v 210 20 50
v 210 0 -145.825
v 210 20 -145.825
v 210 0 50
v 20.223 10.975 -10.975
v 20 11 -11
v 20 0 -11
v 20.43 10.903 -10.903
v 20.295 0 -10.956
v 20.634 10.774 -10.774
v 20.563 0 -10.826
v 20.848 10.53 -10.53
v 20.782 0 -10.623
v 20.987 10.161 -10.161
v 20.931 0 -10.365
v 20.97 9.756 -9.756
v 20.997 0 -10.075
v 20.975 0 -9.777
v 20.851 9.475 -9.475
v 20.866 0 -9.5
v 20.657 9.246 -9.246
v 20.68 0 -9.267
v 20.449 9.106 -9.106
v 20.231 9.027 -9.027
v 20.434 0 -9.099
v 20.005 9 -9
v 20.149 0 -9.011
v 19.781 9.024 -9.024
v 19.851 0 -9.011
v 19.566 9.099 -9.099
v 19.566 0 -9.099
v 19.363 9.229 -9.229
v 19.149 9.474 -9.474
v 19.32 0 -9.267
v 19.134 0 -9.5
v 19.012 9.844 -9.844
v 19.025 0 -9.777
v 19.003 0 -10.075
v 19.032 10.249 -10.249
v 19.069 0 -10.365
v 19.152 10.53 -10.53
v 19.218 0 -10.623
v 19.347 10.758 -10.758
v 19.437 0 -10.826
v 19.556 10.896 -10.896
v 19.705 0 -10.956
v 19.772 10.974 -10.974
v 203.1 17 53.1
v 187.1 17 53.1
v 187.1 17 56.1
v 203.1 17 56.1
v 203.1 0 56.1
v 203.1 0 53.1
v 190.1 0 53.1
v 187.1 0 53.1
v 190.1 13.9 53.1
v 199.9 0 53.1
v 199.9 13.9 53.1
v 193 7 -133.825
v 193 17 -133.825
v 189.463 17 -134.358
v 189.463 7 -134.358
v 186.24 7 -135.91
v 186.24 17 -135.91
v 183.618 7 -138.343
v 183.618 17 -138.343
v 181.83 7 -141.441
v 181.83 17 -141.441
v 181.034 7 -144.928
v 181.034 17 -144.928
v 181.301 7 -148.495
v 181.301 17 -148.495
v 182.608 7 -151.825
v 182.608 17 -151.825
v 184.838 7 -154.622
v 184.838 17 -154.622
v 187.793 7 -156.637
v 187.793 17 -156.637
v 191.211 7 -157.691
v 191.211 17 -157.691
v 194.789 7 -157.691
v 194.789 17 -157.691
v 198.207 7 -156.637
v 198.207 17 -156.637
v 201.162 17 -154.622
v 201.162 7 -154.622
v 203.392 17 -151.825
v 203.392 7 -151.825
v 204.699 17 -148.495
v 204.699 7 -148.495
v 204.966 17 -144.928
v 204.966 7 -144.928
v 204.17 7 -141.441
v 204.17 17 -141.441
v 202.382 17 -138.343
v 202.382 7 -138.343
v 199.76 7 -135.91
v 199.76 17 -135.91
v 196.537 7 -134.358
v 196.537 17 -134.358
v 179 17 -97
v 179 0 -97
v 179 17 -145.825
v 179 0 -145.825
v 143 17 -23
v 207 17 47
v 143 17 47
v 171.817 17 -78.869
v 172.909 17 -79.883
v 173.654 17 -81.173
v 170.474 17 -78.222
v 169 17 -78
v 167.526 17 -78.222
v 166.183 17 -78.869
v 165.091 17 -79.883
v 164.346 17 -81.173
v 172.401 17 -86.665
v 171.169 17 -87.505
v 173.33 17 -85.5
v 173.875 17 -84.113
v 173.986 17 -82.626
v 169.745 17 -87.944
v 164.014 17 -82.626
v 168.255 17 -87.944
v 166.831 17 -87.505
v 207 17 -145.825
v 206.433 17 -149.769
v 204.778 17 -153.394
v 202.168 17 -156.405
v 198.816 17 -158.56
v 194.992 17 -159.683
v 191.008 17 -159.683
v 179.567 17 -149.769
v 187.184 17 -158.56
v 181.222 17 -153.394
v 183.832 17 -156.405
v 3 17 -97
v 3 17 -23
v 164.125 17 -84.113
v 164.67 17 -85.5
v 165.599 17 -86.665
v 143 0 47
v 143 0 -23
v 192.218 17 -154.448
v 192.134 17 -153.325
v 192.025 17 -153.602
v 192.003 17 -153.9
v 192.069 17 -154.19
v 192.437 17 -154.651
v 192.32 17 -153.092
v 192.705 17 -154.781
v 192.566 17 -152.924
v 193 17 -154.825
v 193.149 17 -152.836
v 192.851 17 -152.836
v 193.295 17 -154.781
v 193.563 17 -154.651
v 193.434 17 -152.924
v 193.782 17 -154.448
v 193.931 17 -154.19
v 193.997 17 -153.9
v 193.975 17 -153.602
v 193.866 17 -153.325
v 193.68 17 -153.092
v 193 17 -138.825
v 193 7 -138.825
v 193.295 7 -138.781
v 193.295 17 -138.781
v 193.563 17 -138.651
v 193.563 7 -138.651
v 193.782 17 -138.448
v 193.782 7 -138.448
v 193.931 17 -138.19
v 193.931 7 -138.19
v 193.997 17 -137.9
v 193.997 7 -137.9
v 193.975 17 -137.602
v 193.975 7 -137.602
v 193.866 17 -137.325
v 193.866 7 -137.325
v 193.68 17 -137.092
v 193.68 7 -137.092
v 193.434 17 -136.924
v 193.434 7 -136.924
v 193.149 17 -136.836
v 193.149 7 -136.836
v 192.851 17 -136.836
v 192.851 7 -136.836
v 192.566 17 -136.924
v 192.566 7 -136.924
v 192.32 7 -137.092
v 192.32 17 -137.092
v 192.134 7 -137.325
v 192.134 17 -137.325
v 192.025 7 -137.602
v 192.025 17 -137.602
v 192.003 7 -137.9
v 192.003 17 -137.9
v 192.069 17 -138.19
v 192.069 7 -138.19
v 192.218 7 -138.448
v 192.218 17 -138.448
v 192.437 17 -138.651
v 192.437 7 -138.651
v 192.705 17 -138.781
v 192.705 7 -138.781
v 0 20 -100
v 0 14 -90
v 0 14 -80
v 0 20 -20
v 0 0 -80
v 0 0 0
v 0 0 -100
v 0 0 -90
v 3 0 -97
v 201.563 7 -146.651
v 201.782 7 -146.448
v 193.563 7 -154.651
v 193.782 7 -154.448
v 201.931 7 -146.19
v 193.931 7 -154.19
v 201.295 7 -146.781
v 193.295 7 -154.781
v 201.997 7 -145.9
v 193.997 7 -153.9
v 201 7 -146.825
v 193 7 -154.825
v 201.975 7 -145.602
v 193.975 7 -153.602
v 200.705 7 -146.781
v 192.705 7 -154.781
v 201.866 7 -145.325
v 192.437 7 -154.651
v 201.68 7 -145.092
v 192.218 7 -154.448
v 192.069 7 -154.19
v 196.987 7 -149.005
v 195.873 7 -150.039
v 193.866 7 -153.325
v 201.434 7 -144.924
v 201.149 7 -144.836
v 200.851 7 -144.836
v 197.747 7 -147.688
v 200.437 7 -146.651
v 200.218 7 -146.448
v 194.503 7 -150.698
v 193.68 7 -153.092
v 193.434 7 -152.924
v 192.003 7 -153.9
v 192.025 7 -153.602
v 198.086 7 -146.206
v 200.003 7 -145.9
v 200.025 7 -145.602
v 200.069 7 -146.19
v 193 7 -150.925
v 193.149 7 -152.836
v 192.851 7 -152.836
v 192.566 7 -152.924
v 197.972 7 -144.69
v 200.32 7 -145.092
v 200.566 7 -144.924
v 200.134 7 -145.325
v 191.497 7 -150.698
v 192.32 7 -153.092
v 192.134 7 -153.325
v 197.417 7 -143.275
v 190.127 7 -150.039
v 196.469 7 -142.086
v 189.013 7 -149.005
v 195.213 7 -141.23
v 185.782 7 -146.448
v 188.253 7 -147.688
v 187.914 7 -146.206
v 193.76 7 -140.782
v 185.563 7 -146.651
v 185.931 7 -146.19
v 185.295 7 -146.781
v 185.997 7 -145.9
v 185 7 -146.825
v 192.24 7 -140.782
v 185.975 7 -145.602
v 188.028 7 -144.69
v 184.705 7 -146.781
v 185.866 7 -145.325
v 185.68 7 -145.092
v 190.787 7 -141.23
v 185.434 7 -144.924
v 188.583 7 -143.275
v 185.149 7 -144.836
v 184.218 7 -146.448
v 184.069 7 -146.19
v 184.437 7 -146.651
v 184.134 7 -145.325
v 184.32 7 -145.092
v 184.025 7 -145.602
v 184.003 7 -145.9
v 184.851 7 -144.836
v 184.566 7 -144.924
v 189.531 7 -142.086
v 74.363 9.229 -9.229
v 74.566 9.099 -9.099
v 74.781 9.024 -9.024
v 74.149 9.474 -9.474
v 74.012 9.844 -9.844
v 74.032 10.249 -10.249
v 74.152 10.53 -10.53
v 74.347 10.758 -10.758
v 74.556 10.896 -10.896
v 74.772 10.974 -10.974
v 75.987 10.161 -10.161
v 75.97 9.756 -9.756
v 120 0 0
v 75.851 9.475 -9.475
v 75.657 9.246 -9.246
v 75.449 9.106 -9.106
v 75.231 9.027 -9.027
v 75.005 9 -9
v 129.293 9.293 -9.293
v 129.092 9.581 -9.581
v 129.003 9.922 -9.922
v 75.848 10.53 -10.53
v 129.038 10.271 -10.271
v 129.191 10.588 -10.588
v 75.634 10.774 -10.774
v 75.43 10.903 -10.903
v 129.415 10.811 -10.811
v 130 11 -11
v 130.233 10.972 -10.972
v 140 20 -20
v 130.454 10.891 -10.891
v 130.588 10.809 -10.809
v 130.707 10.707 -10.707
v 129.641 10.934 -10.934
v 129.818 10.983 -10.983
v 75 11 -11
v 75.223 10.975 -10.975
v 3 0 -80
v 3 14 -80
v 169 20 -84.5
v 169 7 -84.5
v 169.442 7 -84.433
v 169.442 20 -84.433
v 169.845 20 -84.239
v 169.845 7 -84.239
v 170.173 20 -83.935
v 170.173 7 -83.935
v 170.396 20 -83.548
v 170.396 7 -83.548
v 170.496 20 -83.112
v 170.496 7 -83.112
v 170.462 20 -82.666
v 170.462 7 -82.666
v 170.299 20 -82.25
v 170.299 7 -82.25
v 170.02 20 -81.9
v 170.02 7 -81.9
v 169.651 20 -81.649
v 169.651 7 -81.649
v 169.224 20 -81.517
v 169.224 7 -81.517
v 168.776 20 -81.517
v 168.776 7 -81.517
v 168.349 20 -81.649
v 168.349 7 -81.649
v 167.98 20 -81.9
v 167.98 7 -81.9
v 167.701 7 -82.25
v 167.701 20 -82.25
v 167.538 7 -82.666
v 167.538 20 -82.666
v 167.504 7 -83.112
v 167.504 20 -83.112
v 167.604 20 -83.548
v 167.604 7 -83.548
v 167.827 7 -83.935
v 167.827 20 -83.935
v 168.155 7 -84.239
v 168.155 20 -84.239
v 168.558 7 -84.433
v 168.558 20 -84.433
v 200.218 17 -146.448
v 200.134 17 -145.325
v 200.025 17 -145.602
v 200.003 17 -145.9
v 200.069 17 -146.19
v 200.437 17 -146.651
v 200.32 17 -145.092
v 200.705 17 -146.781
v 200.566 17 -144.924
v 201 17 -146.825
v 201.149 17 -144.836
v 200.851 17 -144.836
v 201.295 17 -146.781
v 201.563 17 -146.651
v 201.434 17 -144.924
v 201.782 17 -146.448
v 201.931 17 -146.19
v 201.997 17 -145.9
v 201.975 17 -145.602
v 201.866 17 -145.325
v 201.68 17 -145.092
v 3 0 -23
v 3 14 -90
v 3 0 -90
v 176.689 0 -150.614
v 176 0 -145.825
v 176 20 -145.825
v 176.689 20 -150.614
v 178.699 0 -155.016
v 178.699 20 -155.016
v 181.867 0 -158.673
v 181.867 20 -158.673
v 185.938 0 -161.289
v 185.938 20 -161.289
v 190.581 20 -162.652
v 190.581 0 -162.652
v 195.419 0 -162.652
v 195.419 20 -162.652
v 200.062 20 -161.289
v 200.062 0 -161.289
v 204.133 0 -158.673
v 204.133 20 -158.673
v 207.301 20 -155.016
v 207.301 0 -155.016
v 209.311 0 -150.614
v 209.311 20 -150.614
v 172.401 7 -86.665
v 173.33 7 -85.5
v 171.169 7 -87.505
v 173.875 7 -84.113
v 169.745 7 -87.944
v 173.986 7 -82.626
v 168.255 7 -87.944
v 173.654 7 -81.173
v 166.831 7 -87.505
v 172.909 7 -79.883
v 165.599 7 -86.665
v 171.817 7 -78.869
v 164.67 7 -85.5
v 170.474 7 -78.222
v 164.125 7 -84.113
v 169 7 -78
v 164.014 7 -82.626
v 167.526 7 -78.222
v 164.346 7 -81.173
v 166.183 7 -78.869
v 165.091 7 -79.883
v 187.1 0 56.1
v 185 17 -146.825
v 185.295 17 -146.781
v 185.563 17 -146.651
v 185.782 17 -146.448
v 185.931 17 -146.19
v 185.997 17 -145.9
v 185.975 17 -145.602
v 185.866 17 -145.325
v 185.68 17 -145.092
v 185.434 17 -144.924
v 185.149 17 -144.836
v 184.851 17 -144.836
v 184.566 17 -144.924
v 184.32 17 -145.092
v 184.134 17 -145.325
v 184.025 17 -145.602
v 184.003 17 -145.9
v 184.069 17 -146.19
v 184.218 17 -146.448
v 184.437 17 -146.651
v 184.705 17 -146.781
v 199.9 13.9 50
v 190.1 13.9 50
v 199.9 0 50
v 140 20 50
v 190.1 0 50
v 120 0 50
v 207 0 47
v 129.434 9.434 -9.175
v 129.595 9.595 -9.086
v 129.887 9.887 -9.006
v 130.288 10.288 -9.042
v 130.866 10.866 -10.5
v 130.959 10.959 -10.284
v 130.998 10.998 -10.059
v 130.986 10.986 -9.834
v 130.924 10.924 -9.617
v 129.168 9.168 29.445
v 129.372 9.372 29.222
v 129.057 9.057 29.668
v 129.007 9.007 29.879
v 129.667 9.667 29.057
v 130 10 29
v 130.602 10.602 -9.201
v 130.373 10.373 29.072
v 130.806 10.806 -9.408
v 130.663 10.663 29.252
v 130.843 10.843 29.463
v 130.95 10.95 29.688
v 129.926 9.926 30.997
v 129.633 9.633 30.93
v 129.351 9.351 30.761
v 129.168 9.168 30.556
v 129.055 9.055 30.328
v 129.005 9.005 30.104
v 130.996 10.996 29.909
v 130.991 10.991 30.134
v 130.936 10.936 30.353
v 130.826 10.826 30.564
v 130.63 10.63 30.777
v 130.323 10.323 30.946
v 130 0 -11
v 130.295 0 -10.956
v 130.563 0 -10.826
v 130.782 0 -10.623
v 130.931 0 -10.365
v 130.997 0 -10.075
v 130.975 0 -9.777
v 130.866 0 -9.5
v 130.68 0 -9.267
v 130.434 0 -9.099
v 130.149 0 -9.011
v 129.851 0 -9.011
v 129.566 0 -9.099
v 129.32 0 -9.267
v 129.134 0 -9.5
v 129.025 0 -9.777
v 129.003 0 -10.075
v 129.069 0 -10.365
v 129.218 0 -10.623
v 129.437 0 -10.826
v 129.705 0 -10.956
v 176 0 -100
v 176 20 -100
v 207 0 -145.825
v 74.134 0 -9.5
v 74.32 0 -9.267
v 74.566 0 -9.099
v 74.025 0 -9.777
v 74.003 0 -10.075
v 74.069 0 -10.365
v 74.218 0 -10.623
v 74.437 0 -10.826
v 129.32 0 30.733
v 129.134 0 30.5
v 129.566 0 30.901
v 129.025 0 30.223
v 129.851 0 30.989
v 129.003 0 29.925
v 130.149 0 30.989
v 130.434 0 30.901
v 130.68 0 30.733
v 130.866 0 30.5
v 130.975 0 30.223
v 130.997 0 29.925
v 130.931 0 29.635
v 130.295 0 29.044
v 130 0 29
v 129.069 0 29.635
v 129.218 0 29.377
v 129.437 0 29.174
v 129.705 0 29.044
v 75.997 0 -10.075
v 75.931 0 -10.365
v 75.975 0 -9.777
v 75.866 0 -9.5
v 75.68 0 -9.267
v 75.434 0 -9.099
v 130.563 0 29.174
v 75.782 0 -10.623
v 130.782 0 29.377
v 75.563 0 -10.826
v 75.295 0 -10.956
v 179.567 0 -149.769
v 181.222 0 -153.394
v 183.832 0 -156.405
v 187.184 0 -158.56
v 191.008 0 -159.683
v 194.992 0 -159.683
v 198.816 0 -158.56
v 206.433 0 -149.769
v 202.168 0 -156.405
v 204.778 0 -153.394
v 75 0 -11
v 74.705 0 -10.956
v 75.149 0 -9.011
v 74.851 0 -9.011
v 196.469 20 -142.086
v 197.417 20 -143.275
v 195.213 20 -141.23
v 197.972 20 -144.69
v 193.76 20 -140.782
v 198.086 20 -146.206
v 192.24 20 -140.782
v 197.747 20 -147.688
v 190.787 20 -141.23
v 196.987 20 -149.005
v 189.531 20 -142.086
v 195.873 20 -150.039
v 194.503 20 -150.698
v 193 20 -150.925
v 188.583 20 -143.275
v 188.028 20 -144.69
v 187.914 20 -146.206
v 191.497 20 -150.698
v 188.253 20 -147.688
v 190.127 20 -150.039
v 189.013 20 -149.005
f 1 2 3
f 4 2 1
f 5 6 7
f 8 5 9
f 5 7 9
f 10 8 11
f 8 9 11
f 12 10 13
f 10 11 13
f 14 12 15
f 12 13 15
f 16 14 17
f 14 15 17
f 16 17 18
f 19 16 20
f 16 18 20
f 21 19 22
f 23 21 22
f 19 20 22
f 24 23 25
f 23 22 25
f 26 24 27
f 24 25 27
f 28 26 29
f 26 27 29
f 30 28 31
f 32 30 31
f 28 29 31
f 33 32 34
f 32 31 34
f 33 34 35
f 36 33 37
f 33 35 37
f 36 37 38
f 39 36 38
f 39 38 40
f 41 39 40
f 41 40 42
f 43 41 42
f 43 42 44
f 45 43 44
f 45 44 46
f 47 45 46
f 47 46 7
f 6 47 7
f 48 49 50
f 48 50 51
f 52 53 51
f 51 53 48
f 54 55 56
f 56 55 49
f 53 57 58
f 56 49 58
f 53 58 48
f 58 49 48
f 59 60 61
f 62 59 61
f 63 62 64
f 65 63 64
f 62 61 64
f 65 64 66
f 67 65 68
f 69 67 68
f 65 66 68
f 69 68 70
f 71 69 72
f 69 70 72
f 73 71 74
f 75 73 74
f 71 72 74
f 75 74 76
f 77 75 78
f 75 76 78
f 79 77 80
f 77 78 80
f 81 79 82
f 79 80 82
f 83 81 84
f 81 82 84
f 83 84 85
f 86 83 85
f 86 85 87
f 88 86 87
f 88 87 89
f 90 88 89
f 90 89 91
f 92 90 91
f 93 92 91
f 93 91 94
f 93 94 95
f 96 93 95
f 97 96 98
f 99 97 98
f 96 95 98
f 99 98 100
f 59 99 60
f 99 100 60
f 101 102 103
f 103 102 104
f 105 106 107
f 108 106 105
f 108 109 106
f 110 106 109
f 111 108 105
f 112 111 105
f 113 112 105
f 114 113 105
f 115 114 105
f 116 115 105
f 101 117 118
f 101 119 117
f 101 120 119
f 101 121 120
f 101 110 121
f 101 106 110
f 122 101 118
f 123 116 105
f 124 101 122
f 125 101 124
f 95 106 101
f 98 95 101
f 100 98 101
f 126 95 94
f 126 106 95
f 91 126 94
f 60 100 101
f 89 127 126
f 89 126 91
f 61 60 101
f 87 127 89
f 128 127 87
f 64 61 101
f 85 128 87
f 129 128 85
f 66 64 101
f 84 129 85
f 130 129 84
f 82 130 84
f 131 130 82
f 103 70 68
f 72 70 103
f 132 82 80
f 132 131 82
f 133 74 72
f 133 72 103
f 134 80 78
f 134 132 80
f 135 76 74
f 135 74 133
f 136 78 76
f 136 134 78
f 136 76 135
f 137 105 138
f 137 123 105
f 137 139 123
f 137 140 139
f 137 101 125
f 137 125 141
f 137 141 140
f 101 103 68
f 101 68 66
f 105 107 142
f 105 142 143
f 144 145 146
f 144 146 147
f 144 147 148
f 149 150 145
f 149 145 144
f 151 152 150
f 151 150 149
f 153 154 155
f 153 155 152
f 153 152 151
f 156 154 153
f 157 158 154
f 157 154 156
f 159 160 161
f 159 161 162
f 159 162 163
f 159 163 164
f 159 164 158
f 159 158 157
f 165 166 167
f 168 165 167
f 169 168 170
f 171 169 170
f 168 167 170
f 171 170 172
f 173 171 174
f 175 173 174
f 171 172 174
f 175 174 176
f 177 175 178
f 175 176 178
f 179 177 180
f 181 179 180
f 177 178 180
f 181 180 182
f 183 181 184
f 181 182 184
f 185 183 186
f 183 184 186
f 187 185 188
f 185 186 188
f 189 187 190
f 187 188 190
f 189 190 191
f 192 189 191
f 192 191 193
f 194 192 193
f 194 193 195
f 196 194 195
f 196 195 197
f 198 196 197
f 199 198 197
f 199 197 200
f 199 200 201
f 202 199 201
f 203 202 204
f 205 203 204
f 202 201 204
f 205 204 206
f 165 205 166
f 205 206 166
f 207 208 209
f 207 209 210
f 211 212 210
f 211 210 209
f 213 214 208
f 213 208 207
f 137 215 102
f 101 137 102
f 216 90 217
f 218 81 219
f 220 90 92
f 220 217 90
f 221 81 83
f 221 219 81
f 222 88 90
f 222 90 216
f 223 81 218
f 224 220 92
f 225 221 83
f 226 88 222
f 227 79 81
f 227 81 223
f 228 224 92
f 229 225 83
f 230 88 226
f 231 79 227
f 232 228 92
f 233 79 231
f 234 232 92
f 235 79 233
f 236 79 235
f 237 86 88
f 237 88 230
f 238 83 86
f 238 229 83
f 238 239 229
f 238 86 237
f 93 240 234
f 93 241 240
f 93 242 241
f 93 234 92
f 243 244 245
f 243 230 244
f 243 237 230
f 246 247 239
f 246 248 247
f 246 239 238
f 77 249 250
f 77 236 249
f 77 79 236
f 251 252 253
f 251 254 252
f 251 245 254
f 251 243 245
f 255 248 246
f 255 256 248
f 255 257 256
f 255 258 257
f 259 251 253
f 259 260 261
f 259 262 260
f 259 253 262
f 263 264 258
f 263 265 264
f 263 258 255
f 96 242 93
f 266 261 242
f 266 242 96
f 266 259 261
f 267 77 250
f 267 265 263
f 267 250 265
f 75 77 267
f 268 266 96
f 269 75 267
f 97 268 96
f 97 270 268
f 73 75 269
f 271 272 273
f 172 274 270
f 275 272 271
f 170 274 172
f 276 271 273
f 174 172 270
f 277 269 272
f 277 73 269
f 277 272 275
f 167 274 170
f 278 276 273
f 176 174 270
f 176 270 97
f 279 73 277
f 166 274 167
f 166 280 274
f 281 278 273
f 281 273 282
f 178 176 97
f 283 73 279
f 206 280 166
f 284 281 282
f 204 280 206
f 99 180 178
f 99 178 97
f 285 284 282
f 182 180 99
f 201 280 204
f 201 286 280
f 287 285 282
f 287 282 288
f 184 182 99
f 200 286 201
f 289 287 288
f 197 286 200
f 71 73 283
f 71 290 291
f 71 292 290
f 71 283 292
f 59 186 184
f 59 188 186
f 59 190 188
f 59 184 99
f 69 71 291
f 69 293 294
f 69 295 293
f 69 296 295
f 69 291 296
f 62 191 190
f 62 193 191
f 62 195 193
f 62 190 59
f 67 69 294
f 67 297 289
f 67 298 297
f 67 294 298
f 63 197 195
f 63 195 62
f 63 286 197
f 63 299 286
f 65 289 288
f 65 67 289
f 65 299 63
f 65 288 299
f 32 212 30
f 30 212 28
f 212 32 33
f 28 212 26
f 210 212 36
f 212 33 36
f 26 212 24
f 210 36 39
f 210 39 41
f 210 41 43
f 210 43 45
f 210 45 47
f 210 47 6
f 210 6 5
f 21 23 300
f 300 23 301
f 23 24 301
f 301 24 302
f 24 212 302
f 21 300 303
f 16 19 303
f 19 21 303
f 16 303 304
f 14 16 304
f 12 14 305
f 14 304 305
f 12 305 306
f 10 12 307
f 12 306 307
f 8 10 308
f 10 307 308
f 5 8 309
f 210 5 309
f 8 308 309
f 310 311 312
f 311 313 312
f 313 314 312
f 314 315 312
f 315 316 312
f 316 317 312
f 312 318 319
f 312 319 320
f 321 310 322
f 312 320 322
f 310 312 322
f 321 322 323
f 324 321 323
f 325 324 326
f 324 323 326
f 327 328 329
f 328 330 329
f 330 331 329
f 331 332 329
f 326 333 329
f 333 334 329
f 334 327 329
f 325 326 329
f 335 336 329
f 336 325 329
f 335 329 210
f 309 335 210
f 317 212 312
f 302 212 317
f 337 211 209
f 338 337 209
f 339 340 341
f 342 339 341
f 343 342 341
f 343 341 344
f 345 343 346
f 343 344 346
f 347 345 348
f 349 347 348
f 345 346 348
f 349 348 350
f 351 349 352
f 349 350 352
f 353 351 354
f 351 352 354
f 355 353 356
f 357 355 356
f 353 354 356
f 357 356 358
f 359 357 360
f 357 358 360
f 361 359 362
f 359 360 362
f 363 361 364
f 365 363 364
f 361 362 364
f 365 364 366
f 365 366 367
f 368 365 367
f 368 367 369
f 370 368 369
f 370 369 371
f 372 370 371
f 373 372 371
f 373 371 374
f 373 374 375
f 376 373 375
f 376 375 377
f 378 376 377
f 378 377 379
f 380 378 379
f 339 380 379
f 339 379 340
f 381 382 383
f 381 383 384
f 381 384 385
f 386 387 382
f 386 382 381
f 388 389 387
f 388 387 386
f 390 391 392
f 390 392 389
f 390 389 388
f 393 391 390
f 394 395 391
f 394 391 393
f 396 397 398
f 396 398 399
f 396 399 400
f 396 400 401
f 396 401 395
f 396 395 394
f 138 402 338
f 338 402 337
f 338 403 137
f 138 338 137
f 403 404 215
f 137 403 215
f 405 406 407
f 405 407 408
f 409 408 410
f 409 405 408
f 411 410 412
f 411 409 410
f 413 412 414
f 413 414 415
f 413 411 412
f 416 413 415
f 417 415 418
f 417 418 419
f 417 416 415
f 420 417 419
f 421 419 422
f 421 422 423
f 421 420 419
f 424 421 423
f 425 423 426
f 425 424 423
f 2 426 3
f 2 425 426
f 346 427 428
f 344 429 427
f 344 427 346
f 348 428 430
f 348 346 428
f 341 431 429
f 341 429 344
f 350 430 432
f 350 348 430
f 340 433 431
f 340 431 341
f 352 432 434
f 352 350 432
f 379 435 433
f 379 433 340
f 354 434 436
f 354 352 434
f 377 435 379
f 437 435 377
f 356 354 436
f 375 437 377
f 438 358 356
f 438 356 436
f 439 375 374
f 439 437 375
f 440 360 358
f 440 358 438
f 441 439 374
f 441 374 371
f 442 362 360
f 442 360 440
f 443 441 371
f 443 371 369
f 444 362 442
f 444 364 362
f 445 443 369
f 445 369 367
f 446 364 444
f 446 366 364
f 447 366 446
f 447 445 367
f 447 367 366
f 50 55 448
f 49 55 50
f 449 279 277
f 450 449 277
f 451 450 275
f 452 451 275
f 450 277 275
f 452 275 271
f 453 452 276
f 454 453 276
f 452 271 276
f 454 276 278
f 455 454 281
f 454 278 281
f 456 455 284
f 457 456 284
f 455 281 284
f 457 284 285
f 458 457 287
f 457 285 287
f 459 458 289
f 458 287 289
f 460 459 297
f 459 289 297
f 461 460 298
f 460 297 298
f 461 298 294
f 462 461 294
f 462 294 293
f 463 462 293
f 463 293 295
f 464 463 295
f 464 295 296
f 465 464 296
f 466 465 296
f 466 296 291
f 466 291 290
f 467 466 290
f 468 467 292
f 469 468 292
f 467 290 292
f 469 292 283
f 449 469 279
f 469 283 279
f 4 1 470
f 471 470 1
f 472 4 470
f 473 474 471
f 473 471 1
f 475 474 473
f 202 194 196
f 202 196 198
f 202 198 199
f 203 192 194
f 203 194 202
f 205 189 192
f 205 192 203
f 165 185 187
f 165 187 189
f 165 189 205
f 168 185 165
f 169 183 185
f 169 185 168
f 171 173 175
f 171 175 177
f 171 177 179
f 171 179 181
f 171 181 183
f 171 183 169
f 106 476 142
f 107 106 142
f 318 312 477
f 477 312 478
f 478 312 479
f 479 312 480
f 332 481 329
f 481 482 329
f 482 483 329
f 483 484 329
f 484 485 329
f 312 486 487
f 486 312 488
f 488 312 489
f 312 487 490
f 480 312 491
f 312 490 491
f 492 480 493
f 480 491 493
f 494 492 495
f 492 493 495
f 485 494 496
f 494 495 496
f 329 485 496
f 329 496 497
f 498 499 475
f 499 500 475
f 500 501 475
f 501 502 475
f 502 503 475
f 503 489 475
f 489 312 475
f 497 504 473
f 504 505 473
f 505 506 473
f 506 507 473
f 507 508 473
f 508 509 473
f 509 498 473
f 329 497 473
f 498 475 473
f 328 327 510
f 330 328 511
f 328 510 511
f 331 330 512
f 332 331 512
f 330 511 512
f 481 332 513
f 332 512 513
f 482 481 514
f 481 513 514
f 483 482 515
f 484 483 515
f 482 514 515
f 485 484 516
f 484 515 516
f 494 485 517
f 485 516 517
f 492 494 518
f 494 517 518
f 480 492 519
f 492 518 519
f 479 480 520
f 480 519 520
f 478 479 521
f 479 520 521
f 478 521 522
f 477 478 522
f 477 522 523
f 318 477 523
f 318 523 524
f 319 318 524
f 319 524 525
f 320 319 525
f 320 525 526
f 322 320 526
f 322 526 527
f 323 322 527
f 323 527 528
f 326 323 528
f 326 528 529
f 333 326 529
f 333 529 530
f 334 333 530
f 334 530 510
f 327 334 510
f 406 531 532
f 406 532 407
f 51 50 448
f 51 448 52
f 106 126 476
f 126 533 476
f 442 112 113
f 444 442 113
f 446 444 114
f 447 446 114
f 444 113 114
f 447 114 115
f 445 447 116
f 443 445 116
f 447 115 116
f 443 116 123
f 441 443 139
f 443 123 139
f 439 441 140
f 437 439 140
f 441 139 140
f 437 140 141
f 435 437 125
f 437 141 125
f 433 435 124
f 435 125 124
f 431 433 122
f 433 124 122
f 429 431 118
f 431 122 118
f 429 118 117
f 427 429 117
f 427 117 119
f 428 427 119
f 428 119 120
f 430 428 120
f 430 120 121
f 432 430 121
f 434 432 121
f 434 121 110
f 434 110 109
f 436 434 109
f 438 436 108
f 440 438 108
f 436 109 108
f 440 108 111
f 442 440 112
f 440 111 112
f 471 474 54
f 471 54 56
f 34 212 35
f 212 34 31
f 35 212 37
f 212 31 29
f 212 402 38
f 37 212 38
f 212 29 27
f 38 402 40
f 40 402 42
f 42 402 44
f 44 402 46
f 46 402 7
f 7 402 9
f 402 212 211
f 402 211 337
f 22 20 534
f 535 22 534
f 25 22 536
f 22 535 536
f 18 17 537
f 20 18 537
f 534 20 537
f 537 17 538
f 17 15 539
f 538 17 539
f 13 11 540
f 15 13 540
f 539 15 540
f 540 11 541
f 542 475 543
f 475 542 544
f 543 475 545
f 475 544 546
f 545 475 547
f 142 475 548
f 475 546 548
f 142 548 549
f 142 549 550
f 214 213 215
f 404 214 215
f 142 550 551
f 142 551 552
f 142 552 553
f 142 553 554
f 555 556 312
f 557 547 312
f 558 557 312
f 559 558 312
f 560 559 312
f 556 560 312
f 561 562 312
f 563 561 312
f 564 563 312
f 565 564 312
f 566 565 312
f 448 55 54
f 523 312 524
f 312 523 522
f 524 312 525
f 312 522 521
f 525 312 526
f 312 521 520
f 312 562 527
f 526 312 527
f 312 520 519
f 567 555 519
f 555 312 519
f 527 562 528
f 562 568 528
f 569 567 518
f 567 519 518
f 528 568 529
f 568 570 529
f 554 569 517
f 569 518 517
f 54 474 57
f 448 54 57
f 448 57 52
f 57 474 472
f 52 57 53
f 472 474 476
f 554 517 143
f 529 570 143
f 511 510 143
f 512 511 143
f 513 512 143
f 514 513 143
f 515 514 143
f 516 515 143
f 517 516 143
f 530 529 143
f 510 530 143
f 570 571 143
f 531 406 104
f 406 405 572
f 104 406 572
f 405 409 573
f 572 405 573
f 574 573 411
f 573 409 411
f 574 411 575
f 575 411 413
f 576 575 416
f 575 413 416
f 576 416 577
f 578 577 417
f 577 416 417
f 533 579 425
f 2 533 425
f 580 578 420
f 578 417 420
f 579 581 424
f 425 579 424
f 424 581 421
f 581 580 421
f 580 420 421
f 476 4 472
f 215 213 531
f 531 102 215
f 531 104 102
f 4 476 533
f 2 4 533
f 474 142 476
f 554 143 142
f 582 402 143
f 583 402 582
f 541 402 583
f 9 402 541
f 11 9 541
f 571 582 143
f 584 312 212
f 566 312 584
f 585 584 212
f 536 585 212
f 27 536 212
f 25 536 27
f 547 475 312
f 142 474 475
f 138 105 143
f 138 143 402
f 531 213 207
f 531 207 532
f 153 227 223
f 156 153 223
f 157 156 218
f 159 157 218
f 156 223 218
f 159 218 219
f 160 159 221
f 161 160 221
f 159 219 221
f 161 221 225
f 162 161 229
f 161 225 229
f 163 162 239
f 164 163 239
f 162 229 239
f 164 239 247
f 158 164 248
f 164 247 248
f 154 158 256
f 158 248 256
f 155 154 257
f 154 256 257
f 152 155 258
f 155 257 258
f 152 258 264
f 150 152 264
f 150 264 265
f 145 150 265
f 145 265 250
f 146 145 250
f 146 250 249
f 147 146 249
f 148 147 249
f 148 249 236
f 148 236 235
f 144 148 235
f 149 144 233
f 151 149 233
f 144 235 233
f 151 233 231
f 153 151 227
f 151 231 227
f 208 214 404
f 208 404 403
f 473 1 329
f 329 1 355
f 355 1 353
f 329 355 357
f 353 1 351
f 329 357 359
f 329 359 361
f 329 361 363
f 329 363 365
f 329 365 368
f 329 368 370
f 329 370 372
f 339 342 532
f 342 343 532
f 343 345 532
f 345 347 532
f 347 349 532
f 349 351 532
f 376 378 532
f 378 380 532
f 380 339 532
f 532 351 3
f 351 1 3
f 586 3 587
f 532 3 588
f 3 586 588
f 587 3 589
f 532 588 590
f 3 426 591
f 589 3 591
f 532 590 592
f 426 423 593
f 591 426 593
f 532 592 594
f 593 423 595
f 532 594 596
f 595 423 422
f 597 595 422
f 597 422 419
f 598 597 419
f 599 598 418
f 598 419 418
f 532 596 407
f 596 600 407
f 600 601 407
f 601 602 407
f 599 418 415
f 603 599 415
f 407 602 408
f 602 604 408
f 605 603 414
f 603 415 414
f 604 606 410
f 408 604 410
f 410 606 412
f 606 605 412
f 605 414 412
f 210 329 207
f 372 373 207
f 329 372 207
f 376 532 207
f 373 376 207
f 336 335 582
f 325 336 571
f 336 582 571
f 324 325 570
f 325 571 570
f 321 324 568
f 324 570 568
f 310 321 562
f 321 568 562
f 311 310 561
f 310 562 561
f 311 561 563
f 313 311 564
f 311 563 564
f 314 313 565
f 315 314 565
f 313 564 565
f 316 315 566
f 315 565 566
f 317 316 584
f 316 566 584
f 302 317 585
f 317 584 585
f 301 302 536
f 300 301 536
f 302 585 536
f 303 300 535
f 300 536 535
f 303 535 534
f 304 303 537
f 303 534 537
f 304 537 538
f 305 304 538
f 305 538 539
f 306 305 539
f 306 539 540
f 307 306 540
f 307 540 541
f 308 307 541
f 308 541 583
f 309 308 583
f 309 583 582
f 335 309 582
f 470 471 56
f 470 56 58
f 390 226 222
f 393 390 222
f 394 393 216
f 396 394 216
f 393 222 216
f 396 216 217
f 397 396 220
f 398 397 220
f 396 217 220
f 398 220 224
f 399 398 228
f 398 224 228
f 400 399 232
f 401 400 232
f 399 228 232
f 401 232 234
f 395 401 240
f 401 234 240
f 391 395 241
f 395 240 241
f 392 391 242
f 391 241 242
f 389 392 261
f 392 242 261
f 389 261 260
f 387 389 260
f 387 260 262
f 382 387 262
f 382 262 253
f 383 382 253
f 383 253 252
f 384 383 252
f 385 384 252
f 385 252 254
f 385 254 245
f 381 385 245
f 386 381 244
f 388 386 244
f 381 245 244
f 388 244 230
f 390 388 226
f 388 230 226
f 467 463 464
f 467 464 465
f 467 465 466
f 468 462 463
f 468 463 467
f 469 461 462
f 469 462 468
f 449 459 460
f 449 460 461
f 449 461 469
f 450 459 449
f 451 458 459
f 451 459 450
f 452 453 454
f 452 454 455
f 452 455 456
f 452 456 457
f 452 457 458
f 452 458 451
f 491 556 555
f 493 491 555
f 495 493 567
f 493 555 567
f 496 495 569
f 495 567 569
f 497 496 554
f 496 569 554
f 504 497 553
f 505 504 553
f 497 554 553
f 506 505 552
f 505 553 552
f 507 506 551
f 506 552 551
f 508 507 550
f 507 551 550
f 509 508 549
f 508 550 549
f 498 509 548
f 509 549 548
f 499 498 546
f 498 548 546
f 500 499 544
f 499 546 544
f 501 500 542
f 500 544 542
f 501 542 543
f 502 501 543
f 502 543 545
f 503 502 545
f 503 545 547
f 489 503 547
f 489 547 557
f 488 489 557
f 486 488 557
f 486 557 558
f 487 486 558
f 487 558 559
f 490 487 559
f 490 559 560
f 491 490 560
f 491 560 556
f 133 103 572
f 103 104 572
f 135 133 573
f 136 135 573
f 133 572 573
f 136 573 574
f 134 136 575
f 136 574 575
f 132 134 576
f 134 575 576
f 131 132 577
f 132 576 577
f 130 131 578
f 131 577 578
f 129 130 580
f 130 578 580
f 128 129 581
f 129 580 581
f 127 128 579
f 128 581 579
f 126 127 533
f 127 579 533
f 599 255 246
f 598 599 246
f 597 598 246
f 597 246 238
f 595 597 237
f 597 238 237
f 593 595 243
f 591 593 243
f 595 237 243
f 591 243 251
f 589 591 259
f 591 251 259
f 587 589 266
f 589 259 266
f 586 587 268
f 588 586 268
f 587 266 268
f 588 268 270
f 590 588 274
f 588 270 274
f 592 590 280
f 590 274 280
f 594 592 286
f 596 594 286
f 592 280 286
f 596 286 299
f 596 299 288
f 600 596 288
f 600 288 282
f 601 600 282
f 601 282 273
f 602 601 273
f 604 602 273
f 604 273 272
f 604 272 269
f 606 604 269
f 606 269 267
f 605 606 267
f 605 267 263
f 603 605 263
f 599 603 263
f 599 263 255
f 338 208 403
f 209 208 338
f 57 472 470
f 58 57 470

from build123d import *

# Parameters (mm, degrees)
CORNERBOSS_EXTRUDE1_DEPTH               = 20
SHELL1_T                                = -3
PUTBACKPARTOFSHELLBOSS_EXTRUDE1_DEPTH   = 17
TABHOLECUTSSKETCH1_R                    = 1
TABHOLECUTS_EXTRUDE3_DEPTH              = 267.480732183
PADSKETCH2_R                            = 12
PADSKETCH2_R_2                          = 5
PADBOSS_EXTRUDE2_DEPTH                  = 10
STEPPERRODHOLESKETCH3_R                 = 5.1
STEPPERRODHOLESKETCH3_R_2               = 1.5
STEPPERRODHOLECUT_EXTRUDE1_DEPTH        = 267.046951918
THREADEDNUTMOUNTHOLESSKETCH4_R          = 1
THREADEDNUTMOUNTHOLESCUT_EXTRUDE2_DEPTH = 10
TLPEGHOLESKETCH1_W                      = 10
TLPEGHOLESKETCH1_H                      = 14
TLPEGHOLECUT_EXTRUDE1_DEPTH             = 3
BOTTOMPEGSKETCH2_W                      = 9.8
BOTTOMPEGSKETCH2_H                      = 13.9
BOTTOMPEGBOSS_EXTRUDE1_DEPTH            = 3.1
BOTTOMPEGCAPSKETCH3_W                   = 16
BOTTOMPEGCAPSKETCH3_H                   = 17
BOTTOMPEGCAPBOSS_EXTRUDE2_DEPTH         = 3


with BuildPart() as part:
    # CornerSketch1 → CornerBoss-Extrude1 (new body)
    with BuildSketch(Plane(origin=(0, 0, 0), x_dir=(1, 0, 0), z_dir=(0, 1, 0))):
        with BuildLine():
            Line((210, -50), (120, -50))
            Line((120, -50), (120, 0))
            Line((120, 0), (0, 0))
            Line((0, 0), (0, 100))
            Line((0, 100), (176, 100))
            Line((176, 100), (176, 145.825))
            ThreePointArc((176, 145.825), (193, 162.825), (210, 145.825))
            Line((210, 145.825), (210, -50))
        make_face()
    extrude(amount=CORNERBOSS_EXTRUDE1_DEPTH)

    # Shell1
    shell1_openings = [part.faces().sort_by_distance(p)[0] for p in [
        (121.249517572, 0, -43.561989295),
    ]]
    offset(amount=SHELL1_T, openings=shell1_openings, kind=Kind.INTERSECTION)

    # PutBackPartOfShellSketch1 → PutBackPartOfShellBoss-Extrude1 (add)
    with BuildSketch(Plane.XZ.offset(-17)):
        Polygon((3, -3), (123, -3), (123, 47), (143, 47), (143, -23), (3, -23), align=None)
    extrude(amount=PUTBACKPARTOFSHELLBOSS_EXTRUDE1_DEPTH)

    # TabHoleCutsSketch1 → TabHoleCuts-Extrude3 (cut, through all)
    with BuildSketch(Plane.XZ):
        with Locations(Location((130, 30, 0), (0, 0, 270))):
            Circle(TABHOLECUTSSKETCH1_R)
        with Locations(Location((130, -10, 0), (0, 0, 270))):
            Circle(TABHOLECUTSSKETCH1_R)
        with Locations(Location((75, -10, 0), (0, 0, 270))):
            Circle(TABHOLECUTSSKETCH1_R)
        with Locations(Location((20, -10, 0), (0, 0, 270))):
            Circle(TABHOLECUTSSKETCH1_R)
    extrude(amount=-TABHOLECUTS_EXTRUDE3_DEPTH, mode=Mode.SUBTRACT)

    # PadSketch2 → PadBoss-Extrude2 (add)
    with BuildSketch(Plane.XZ.offset(-17)):
        with Locations(Location((193, -145.825, 0), (0, 0, 90))):
            Circle(PADSKETCH2_R)
        with Locations(Location((169, -83, 0), (0, 0, 90))):
            Circle(PADSKETCH2_R_2)
    extrude(amount=PADBOSS_EXTRUDE2_DEPTH)

    # StepperRodHoleSketch3 → StepperRodHoleCut-Extrude1 (cut, through all)
    with BuildSketch(Plane.XZ.offset(-7)):
        with Locations(Location((193, -145.825, 0), (0, 0, 270))):
            Circle(STEPPERRODHOLESKETCH3_R)
        with Locations(Location((169, -83, 0), (0, 0, 270))):
            Circle(STEPPERRODHOLESKETCH3_R_2)
    extrude(amount=-STEPPERRODHOLECUT_EXTRUDE1_DEPTH, mode=Mode.SUBTRACT)

    # ThreadedNutMountHolesSketch4 → ThreadedNutMountHolesCut-Extrude2 (cut)
    with BuildSketch(Plane(origin=(0, 7, 0), x_dir=(-1, 0, 0), z_dir=(0, -1, 0))):
        with Locations(Location((-193, 153.825, 0), (0, 0, 90))):
            Circle(THREADEDNUTMOUNTHOLESSKETCH4_R)
        with Locations(Location((-185, 145.825, 0), (0, 0, 90))):
            Circle(THREADEDNUTMOUNTHOLESSKETCH4_R)
        with Locations(Location((-201, 145.825, 0), (0, 0, 90))):
            Circle(THREADEDNUTMOUNTHOLESSKETCH4_R)
        with Locations(Location((-193, 137.825, 0), (0, 0, 90))):
            Circle(THREADEDNUTMOUNTHOLESSKETCH4_R)
    extrude(amount=-THREADEDNUTMOUNTHOLESCUT_EXTRUDE2_DEPTH, mode=Mode.SUBTRACT)

    # TLPegHoleSketch1 → TLPegHoleCut-Extrude1 (cut)
    with BuildSketch(Plane.ZY):
        with Locations((-85, 7)):
            Rectangle(TLPEGHOLESKETCH1_W, TLPEGHOLESKETCH1_H)
    extrude(amount=-TLPEGHOLECUT_EXTRUDE1_DEPTH, mode=Mode.SUBTRACT)

    # BottomPegSketch2 → BottomPegBoss-Extrude1 (add)
    with BuildSketch(Plane.XY.offset(50)):
        with Locations((195, 6.95)):
            Rectangle(BOTTOMPEGSKETCH2_W, BOTTOMPEGSKETCH2_H)
    extrude(amount=BOTTOMPEGBOSS_EXTRUDE1_DEPTH)

    # BottomPegCapSketch3 → BottomPegCapBoss-Extrude2 (add)
    with BuildSketch(Plane.XY.offset(53.1)):
        with Locations((195.1, 8.5)):
            Rectangle(BOTTOMPEGCAPSKETCH3_W, BOTTOMPEGCAPSKETCH3_H)
    extrude(amount=BOTTOMPEGCAPBOSS_EXTRUDE2_DEPTH)

    # OverlapChamfer1
    # the kernel refuses this chamfer: 20 mm, written as the material it takes off along each edge
    with BuildSketch(Plane(origin=(120, 20, 50), x_dir=(-0.027495876610586317, -0.9996219169112968, 0), z_dir=(0, 0, -1))) as overlapchamfer1_piece_1:
        with BuildLine():
            Line((20.573463904, 0), (-1.130943098, -20.54235587))
            Line((-1.130943098, -20.54235587), (-1.530791864, -20.53135752))
            ThreePointArc((-1.530791864, -20.53135752), (-0.682584541, -10.267956593), (-0.399848767, 0.010998351))
            Line((-0.399848767, 0.010998351), (0.010998351, 0.399848767))
            ThreePointArc((0.010998351, 0.399848767), (10.289953294, 0.117112992), (20.584462254, 0.399848767))
            Line((20.584462254, 0.399848767), (20.573463904, 0))
        make_face()
    extrude(amount=50, mode=Mode.SUBTRACT)
    with BuildSketch(Plane(origin=(120, 20, 0), x_dir=(0, -0.9996219169112968, 0.027495876610586372), z_dir=(-1, 0, 0))) as overlapchamfer1_piece_2:
        with BuildLine():
            Line((20.573463904, 0), (-1.130943098, -20.54235587))
            Line((-1.130943098, -20.54235587), (-1.530791864, -20.53135752))
            ThreePointArc((-1.530791864, -20.53135752), (-0.682584541, -10.267956593), (-0.399848767, 0.010998351))
            Line((-0.399848767, 0.010998351), (0.010998351, 0.399848767))
            ThreePointArc((0.010998351, 0.399848767), (10.289953294, 0.117112992), (20.584462254, 0.399848767))
            Line((20.584462254, 0.399848767), (20.573463904, 0))
        make_face()
    extrude(amount=120, mode=Mode.SUBTRACT)
    with BuildSketch(Plane(origin=(120, 20, 50), x_dir=(-0.027495876610586317, -0.9996219169112968, 0), z_dir=(0, 0, -1))) as overlapchamfer1_piece_3a_section:
        with BuildLine():
            Line((20.573463904, 0), (-1.130943098, -20.54235587))
            Line((-1.130943098, -20.54235587), (-1.530791864, -20.53135752))
            ThreePointArc((-1.530791864, -20.53135752), (-0.682584541, -10.267956593), (-0.399848767, 0.010998351))
            Line((-0.399848767, 0.010998351), (0.010998351, 0.399848767))
            ThreePointArc((0.010998351, 0.399848767), (10.289953294, 0.117112992), (20.584462254, 0.399848767))
            Line((20.584462254, 0.399848767), (20.573463904, 0))
        make_face()
    overlapchamfer1_piece_3a = extrude(amount=101.433659759, mode=Mode.PRIVATE)
    overlapchamfer1_piece_3a = split(overlapchamfer1_piece_3a, bisect_by=Plane(origin=(126.595872536, 13.404127464, 0), z_dir=(0, 0, -1)), keep=Keep.TOP, mode=Mode.PRIVATE)
    with BuildSketch(Plane(origin=(171.433659759, 20, 0), x_dir=(0, -0.9996219169112968, 0.027495876610586372), z_dir=(-1, 0, 0))) as overlapchamfer1_piece_3b_section:
        with BuildLine():
            Line((20.573463904, 0), (-1.130943098, -20.54235587))
            Line((-1.130943098, -20.54235587), (-1.530791864, -20.53135752))
            ThreePointArc((-1.530791864, -20.53135752), (-0.682584541, -10.267956593), (-0.399848767, 0.010998351))
            Line((-0.399848767, 0.010998351), (0.010998351, 0.399848767))
            ThreePointArc((0.010998351, 0.399848767), (10.289953294, 0.117112992), (20.584462254, 0.399848767))
            Line((20.584462254, 0.399848767), (20.573463904, 0))
        make_face()
    overlapchamfer1_piece_3b = extrude(amount=171.433659759, mode=Mode.PRIVATE)
    overlapchamfer1_piece_3b = split(overlapchamfer1_piece_3b, bisect_by=Plane(origin=(120, 13.404127464, -6.595872536), z_dir=(1, 0, 0)), keep=Keep.TOP, mode=Mode.PRIVATE)
    overlapchamfer1_piece_3 = overlapchamfer1_piece_3a & overlapchamfer1_piece_3b
    add(overlapchamfer1_piece_3, mode=Mode.SUBTRACT)


solid = part.part
